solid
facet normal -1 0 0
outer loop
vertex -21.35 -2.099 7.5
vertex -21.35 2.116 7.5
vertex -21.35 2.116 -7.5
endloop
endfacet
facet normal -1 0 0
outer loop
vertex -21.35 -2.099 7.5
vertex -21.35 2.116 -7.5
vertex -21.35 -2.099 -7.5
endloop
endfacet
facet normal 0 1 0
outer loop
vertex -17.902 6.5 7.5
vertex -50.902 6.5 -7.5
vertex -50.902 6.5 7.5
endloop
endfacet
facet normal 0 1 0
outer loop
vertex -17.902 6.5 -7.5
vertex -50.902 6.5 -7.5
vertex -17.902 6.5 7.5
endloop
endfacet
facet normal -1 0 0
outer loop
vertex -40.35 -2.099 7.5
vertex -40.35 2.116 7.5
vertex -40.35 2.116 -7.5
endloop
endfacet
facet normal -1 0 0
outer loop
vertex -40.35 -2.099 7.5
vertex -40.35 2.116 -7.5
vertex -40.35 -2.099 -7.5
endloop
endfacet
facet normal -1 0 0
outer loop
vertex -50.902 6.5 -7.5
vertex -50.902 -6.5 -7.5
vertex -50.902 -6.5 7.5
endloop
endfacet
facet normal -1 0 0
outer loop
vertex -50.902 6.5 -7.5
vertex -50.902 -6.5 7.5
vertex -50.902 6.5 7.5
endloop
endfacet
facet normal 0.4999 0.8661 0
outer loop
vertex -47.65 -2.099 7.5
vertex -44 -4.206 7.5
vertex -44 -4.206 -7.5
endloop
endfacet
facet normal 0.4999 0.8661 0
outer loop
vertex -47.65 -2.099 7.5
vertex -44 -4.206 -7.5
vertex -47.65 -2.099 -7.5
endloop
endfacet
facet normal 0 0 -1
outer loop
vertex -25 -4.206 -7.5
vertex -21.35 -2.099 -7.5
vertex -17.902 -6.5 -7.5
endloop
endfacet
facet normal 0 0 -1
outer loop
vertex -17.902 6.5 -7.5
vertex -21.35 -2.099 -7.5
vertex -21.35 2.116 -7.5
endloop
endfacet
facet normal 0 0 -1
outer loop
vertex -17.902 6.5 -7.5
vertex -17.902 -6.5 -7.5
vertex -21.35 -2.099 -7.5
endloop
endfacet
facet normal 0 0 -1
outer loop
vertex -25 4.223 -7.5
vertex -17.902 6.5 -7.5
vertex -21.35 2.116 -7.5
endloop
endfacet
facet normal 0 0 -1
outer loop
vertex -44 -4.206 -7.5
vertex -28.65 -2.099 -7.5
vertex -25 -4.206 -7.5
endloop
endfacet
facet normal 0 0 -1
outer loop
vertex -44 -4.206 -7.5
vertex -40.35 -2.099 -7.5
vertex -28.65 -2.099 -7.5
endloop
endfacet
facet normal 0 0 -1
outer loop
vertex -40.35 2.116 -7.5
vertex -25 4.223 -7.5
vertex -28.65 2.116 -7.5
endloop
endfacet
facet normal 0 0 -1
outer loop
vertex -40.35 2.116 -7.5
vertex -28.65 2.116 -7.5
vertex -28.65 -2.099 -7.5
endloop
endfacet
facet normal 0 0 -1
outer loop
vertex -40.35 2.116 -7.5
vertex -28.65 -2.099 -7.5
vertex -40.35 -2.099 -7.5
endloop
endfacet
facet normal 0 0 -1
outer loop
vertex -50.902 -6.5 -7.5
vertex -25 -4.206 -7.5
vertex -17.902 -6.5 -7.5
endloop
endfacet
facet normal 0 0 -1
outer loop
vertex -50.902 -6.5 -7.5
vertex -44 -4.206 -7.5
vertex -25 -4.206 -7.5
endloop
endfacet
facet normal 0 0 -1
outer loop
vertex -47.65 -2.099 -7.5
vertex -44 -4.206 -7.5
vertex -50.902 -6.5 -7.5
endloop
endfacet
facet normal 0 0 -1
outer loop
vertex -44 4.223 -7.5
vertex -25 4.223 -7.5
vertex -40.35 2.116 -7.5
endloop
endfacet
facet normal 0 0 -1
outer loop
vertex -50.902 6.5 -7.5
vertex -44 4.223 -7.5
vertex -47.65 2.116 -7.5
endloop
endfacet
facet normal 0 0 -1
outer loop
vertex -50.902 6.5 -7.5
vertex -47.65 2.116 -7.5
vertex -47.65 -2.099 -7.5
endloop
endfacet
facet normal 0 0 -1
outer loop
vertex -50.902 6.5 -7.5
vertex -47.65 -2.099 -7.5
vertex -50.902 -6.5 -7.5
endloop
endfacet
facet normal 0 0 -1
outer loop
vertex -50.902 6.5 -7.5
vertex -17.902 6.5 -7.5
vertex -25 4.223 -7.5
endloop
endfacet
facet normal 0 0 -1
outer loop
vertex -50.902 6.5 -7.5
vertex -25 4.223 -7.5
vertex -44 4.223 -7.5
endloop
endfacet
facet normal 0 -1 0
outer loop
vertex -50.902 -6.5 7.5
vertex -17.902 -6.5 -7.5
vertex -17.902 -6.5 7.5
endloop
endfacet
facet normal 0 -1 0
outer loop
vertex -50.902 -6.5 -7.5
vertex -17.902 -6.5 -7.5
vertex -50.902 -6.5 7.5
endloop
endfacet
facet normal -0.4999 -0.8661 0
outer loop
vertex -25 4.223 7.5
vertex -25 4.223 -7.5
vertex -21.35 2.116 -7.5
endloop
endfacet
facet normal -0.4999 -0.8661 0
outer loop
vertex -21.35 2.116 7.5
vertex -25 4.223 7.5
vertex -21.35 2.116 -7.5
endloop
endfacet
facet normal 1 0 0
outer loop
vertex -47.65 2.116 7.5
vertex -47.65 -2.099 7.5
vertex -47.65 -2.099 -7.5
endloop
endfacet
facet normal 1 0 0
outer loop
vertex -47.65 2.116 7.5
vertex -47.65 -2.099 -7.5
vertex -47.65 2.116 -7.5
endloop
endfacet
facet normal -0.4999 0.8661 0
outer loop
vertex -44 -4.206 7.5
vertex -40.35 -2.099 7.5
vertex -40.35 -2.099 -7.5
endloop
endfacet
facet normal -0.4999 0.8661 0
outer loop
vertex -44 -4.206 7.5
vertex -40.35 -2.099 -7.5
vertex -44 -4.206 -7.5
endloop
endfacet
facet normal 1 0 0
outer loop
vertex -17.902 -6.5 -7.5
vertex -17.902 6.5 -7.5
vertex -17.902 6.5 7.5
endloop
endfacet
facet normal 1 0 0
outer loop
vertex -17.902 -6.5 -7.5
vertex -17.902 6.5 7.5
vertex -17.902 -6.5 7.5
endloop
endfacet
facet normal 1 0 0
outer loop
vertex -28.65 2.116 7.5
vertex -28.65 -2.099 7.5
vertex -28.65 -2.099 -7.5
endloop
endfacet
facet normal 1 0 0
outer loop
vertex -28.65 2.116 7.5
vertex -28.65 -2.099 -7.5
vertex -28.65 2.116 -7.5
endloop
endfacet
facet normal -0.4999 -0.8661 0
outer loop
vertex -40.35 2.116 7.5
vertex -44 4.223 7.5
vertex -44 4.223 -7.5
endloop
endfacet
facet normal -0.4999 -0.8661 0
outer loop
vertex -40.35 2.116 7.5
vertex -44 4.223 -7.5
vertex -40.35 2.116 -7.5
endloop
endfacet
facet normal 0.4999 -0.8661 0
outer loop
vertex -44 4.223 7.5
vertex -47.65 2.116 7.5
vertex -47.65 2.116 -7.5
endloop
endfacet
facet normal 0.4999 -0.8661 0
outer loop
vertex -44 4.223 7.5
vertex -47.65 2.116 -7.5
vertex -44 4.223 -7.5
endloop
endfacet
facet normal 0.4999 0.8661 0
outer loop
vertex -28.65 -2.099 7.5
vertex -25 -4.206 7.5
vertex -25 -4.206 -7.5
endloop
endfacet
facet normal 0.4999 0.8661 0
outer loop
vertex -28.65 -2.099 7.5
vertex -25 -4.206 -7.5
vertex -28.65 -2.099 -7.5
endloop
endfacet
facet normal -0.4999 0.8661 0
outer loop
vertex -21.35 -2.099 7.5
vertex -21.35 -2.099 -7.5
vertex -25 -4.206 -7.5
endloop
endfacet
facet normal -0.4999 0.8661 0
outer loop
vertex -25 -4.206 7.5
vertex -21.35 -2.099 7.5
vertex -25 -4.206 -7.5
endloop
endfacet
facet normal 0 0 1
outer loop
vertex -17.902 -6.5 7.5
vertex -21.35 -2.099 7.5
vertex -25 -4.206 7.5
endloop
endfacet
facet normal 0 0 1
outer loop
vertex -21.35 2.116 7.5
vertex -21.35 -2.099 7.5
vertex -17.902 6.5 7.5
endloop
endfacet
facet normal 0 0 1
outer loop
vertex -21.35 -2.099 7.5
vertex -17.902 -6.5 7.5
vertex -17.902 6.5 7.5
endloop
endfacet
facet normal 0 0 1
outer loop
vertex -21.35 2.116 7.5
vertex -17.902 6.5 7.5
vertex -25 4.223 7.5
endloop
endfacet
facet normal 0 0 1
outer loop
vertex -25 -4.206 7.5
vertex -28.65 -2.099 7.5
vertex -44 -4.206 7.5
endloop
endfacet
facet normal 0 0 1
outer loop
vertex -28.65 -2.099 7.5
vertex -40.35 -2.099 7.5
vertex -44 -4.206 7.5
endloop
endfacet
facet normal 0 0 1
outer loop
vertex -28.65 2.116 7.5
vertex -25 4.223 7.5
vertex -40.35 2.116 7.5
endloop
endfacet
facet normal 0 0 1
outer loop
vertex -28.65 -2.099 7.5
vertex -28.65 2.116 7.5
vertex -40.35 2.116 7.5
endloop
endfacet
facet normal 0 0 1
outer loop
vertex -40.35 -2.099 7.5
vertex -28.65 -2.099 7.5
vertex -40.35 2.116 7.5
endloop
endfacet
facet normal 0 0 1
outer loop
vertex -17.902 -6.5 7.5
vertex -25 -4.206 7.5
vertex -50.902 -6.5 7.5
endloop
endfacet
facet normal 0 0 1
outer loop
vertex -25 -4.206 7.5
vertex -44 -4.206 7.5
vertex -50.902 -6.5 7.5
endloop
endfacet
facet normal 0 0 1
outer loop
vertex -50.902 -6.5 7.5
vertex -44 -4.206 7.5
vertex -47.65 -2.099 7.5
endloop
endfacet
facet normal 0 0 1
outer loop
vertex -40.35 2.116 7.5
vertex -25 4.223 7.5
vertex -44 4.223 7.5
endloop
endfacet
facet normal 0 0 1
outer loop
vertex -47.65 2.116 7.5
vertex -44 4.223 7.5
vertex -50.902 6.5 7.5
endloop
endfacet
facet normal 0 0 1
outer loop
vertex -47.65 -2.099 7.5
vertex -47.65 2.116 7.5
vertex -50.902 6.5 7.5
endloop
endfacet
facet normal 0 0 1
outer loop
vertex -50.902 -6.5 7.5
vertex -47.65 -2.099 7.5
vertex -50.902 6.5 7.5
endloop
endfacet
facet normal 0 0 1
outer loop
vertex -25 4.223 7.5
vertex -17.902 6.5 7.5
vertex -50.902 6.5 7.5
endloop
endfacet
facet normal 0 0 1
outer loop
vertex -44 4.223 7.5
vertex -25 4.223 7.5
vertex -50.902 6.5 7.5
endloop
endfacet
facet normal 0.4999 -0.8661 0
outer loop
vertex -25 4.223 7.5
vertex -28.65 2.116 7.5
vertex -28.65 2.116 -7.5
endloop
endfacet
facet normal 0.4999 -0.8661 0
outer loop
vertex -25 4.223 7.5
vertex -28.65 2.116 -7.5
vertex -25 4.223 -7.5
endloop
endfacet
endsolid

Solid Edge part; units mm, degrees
sketch "Sketch1" plane through (0, 0, 0) normal (0, 0, 1) x (1, 0, 0)
  line L0 (-28.65, 2.1155) -> (-25, 4.2228)
  line L1 (-25, 4.2228) -> (-21.35, 2.1155)
  line L2 (-21.35, 2.1155) -> (-21.35, -2.0992)
  line L3 (-21.35, -2.0992) -> (-25, -4.2065)
  line L4 (-25, -4.2065) -> (-28.65, -2.0992)
  line L5 (-28.65, -2.0992) -> (-28.65, 2.1155)
  line L6 (-50.9022, 6.5) -> (-17.9022, 6.5)
  line L7 (-17.9022, 6.5) -> (-17.9022, -6.5)
  line L8 (-17.9022, -6.5) -> (-50.9022, -6.5)
  line L9 (-50.9022, -6.5) -> (-50.9022, 6.5)
  line L10 (-47.65, 2.1155) -> (-44, 4.2228)
  line L11 (-44, 4.2228) -> (-40.35, 2.1155)
  line L12 (-40.35, 2.1155) -> (-40.35, -2.0992)
  line L13 (-40.35, -2.0992) -> (-44, -4.2065)
  line L14 (-44, -4.2065) -> (-47.65, -2.0992)
  line L15 (-47.65, -2.0992) -> (-47.65, 2.1155)
  dimension "D1" = 5.5081
  dimension "D2" = 11
  dimension "D3" = 0.2
  dimension "D4" = 0.2
  dimension "D5" = 1
  dimension "D6" = 1.5
  dimension "D7" = 1.5
  dimension "D8" = 30
  dimension "D9" = 30
extrude "Protrusion1" add sketch "Sketch1" along normal mid plane 15
